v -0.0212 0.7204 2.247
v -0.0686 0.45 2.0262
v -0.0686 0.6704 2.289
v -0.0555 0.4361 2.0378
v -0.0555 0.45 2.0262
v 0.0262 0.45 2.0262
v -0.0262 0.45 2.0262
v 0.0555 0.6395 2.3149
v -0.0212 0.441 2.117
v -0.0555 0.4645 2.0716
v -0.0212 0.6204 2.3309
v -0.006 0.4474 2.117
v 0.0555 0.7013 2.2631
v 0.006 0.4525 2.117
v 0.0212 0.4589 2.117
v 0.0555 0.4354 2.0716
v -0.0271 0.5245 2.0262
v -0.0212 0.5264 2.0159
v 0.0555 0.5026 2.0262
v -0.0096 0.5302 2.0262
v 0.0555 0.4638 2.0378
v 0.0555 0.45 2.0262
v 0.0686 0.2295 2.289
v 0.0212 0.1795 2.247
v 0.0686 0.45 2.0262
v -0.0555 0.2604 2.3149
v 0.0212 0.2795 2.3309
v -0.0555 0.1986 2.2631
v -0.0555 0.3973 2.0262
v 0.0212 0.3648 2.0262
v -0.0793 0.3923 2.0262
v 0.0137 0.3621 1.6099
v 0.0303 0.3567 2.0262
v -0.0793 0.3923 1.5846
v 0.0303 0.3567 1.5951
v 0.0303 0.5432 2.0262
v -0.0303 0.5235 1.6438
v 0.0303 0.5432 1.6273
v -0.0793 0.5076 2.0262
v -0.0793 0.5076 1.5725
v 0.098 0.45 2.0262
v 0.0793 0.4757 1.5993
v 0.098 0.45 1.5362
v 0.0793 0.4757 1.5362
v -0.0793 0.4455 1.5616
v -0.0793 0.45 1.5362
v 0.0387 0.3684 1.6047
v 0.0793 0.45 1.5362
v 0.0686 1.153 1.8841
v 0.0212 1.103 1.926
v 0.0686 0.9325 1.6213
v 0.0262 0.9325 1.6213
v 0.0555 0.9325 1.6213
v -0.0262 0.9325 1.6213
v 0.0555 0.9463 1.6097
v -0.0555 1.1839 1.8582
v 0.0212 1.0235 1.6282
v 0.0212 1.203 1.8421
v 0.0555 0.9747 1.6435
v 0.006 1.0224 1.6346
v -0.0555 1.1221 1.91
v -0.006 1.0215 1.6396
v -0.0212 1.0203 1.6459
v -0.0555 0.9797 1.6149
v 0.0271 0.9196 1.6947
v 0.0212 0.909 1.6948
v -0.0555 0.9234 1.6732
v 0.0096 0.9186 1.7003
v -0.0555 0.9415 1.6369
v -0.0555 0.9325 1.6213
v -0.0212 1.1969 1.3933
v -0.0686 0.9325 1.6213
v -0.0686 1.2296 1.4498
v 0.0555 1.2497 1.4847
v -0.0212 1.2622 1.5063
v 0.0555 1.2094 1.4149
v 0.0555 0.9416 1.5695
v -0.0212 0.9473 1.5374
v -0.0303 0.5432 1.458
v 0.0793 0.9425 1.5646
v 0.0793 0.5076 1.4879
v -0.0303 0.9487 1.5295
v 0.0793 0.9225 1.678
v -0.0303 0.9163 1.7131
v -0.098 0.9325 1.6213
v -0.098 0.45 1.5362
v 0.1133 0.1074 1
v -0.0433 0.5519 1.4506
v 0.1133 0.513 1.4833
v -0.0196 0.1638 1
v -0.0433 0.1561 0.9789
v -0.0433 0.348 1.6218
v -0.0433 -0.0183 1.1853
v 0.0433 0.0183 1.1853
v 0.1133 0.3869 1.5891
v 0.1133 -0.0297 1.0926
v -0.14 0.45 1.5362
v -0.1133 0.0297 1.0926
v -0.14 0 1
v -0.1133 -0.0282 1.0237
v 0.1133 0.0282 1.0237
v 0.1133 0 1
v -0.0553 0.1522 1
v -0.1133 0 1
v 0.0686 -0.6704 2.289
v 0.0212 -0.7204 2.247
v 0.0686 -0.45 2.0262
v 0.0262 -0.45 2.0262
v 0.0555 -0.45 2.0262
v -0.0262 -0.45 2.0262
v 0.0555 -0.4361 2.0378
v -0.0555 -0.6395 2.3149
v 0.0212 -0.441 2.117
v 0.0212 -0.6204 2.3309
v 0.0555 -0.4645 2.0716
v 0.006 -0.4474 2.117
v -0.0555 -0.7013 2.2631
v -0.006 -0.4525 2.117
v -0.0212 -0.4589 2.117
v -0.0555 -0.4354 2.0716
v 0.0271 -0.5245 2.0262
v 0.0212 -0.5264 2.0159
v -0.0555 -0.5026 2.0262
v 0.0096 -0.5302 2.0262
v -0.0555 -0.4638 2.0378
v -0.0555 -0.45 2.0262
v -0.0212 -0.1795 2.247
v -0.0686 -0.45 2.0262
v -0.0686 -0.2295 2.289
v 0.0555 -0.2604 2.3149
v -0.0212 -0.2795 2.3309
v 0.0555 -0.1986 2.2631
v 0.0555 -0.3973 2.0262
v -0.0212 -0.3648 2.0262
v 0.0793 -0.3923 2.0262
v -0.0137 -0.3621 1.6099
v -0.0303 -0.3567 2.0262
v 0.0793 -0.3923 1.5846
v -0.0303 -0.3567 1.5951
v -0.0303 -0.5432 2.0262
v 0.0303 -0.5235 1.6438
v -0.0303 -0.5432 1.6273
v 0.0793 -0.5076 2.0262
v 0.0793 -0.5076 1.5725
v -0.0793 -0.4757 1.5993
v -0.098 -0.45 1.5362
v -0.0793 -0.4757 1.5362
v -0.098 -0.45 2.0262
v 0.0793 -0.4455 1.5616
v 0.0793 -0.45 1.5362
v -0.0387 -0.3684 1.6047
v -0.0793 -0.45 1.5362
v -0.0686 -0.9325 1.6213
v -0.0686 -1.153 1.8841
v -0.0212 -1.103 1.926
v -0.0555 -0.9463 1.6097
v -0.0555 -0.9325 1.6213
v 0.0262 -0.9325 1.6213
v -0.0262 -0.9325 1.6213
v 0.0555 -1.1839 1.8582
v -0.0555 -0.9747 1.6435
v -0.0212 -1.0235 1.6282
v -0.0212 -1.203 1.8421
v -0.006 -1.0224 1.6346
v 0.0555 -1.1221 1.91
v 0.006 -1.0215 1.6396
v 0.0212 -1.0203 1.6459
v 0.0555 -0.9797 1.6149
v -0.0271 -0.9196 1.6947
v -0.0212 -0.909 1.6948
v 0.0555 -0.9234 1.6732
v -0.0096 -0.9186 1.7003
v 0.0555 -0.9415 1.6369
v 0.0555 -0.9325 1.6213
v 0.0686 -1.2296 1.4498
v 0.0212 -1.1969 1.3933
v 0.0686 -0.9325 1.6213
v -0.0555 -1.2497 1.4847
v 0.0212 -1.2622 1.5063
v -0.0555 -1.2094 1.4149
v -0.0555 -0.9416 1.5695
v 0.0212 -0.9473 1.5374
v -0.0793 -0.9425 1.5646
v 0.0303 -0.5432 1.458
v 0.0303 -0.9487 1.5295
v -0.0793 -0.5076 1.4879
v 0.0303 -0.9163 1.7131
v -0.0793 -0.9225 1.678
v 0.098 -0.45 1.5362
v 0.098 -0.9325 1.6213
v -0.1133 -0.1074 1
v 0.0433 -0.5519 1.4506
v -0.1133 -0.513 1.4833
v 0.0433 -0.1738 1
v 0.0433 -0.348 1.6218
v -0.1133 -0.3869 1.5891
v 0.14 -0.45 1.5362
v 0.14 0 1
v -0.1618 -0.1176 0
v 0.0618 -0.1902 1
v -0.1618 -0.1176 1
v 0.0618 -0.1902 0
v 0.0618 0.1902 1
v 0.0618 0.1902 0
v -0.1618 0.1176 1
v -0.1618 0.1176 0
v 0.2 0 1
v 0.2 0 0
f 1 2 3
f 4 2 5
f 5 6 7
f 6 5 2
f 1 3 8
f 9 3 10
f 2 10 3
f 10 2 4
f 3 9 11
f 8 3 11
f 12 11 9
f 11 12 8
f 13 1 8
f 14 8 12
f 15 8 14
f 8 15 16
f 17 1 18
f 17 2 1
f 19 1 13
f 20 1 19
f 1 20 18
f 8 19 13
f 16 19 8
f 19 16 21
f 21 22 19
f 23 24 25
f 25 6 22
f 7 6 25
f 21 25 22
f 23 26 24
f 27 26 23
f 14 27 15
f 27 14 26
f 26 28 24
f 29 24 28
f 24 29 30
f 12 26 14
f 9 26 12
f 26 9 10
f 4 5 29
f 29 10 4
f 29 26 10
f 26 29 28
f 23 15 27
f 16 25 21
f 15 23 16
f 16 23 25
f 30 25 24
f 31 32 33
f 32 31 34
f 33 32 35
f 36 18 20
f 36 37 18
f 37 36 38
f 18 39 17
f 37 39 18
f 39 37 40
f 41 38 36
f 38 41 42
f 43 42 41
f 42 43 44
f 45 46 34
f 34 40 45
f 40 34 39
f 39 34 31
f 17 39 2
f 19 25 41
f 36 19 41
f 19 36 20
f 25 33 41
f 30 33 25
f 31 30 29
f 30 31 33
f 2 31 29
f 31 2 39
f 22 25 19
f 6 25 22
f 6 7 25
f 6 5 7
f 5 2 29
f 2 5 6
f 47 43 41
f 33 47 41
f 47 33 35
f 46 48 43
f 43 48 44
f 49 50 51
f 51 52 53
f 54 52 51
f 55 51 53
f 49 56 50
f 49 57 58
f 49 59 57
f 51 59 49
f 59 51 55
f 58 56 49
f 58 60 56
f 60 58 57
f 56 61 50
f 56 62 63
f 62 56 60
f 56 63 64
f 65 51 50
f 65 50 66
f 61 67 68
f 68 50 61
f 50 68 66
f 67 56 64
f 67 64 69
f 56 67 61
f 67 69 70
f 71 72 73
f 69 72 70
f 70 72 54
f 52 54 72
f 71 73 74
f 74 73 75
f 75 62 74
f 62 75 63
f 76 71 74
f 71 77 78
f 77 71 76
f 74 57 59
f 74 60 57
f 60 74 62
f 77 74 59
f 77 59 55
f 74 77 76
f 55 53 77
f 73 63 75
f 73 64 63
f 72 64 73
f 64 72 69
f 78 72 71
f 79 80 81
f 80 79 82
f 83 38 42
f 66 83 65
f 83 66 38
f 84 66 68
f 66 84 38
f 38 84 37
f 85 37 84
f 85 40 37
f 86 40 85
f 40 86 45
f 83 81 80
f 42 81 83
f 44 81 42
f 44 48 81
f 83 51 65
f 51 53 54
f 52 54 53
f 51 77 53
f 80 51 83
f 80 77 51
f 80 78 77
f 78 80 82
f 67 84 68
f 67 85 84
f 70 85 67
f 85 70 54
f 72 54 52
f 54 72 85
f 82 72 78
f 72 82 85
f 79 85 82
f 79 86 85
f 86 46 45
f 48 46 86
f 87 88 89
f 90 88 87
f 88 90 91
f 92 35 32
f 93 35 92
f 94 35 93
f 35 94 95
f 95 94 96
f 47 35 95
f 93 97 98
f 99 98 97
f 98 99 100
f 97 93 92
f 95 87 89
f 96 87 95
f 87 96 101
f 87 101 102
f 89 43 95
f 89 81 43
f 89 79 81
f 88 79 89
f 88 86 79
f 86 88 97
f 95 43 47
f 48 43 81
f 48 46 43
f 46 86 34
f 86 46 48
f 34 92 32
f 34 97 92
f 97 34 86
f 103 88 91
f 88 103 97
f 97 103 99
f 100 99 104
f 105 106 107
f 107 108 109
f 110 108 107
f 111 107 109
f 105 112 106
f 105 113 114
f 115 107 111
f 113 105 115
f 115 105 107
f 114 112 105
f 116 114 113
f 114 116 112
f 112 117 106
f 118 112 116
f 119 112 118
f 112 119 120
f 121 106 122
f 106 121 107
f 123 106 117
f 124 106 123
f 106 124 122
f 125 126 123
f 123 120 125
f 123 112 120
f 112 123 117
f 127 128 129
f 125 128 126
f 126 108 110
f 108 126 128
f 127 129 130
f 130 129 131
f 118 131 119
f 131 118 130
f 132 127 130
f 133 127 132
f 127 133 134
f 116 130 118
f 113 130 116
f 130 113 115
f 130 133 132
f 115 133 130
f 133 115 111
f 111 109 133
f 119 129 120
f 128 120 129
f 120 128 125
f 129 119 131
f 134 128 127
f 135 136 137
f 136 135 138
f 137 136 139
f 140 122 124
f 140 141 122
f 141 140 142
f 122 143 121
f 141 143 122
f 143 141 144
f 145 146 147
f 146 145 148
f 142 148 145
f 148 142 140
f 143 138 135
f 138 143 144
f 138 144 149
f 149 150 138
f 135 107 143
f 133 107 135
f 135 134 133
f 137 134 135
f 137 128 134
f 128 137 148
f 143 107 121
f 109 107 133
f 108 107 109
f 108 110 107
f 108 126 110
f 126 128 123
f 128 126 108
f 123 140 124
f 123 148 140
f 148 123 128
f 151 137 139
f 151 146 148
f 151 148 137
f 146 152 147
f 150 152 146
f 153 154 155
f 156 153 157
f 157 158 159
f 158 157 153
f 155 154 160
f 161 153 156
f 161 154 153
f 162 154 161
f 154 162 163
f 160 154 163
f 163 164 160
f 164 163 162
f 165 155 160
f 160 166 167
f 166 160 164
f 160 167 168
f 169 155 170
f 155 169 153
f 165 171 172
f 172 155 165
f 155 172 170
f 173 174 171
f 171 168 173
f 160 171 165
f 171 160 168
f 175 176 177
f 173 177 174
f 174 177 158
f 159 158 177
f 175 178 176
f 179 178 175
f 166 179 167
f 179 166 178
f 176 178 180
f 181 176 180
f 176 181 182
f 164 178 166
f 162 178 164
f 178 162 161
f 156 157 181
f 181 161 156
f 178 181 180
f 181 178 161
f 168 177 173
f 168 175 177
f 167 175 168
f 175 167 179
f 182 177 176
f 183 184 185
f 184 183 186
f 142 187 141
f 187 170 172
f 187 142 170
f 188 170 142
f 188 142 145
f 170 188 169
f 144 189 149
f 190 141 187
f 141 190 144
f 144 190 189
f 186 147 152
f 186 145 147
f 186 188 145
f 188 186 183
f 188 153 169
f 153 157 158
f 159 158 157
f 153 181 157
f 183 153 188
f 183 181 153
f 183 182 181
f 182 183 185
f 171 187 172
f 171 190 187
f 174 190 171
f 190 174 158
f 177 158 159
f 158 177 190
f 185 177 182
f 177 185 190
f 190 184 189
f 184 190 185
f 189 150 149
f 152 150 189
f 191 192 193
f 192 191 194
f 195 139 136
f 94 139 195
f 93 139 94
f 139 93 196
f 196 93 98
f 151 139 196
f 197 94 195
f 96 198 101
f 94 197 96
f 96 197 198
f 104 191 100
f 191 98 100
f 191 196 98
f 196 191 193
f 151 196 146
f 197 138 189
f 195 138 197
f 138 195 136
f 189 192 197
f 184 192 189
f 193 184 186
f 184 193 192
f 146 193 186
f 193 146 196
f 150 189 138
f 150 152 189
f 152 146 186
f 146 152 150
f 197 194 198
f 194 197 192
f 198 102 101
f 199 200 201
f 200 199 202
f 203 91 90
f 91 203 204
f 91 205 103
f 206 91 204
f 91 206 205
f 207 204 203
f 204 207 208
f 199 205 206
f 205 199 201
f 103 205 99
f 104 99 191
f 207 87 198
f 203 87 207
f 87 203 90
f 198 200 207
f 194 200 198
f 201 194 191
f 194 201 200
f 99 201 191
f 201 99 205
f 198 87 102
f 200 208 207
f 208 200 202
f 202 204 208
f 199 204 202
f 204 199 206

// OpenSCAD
module tree(currentScale, levels)
{
  h = currentScale;
  w = currentScale/5;
  childScale = currentScale * 0.7;

  if (levels > 0) {
    cylinder(r=w, h=h);
    translate([0,0,h]) for (i = [1:2]) {
      rotate([40, 0, i * 180]) tree(childScale, levels-1);
    }
  }
}

tree(1, 4);
